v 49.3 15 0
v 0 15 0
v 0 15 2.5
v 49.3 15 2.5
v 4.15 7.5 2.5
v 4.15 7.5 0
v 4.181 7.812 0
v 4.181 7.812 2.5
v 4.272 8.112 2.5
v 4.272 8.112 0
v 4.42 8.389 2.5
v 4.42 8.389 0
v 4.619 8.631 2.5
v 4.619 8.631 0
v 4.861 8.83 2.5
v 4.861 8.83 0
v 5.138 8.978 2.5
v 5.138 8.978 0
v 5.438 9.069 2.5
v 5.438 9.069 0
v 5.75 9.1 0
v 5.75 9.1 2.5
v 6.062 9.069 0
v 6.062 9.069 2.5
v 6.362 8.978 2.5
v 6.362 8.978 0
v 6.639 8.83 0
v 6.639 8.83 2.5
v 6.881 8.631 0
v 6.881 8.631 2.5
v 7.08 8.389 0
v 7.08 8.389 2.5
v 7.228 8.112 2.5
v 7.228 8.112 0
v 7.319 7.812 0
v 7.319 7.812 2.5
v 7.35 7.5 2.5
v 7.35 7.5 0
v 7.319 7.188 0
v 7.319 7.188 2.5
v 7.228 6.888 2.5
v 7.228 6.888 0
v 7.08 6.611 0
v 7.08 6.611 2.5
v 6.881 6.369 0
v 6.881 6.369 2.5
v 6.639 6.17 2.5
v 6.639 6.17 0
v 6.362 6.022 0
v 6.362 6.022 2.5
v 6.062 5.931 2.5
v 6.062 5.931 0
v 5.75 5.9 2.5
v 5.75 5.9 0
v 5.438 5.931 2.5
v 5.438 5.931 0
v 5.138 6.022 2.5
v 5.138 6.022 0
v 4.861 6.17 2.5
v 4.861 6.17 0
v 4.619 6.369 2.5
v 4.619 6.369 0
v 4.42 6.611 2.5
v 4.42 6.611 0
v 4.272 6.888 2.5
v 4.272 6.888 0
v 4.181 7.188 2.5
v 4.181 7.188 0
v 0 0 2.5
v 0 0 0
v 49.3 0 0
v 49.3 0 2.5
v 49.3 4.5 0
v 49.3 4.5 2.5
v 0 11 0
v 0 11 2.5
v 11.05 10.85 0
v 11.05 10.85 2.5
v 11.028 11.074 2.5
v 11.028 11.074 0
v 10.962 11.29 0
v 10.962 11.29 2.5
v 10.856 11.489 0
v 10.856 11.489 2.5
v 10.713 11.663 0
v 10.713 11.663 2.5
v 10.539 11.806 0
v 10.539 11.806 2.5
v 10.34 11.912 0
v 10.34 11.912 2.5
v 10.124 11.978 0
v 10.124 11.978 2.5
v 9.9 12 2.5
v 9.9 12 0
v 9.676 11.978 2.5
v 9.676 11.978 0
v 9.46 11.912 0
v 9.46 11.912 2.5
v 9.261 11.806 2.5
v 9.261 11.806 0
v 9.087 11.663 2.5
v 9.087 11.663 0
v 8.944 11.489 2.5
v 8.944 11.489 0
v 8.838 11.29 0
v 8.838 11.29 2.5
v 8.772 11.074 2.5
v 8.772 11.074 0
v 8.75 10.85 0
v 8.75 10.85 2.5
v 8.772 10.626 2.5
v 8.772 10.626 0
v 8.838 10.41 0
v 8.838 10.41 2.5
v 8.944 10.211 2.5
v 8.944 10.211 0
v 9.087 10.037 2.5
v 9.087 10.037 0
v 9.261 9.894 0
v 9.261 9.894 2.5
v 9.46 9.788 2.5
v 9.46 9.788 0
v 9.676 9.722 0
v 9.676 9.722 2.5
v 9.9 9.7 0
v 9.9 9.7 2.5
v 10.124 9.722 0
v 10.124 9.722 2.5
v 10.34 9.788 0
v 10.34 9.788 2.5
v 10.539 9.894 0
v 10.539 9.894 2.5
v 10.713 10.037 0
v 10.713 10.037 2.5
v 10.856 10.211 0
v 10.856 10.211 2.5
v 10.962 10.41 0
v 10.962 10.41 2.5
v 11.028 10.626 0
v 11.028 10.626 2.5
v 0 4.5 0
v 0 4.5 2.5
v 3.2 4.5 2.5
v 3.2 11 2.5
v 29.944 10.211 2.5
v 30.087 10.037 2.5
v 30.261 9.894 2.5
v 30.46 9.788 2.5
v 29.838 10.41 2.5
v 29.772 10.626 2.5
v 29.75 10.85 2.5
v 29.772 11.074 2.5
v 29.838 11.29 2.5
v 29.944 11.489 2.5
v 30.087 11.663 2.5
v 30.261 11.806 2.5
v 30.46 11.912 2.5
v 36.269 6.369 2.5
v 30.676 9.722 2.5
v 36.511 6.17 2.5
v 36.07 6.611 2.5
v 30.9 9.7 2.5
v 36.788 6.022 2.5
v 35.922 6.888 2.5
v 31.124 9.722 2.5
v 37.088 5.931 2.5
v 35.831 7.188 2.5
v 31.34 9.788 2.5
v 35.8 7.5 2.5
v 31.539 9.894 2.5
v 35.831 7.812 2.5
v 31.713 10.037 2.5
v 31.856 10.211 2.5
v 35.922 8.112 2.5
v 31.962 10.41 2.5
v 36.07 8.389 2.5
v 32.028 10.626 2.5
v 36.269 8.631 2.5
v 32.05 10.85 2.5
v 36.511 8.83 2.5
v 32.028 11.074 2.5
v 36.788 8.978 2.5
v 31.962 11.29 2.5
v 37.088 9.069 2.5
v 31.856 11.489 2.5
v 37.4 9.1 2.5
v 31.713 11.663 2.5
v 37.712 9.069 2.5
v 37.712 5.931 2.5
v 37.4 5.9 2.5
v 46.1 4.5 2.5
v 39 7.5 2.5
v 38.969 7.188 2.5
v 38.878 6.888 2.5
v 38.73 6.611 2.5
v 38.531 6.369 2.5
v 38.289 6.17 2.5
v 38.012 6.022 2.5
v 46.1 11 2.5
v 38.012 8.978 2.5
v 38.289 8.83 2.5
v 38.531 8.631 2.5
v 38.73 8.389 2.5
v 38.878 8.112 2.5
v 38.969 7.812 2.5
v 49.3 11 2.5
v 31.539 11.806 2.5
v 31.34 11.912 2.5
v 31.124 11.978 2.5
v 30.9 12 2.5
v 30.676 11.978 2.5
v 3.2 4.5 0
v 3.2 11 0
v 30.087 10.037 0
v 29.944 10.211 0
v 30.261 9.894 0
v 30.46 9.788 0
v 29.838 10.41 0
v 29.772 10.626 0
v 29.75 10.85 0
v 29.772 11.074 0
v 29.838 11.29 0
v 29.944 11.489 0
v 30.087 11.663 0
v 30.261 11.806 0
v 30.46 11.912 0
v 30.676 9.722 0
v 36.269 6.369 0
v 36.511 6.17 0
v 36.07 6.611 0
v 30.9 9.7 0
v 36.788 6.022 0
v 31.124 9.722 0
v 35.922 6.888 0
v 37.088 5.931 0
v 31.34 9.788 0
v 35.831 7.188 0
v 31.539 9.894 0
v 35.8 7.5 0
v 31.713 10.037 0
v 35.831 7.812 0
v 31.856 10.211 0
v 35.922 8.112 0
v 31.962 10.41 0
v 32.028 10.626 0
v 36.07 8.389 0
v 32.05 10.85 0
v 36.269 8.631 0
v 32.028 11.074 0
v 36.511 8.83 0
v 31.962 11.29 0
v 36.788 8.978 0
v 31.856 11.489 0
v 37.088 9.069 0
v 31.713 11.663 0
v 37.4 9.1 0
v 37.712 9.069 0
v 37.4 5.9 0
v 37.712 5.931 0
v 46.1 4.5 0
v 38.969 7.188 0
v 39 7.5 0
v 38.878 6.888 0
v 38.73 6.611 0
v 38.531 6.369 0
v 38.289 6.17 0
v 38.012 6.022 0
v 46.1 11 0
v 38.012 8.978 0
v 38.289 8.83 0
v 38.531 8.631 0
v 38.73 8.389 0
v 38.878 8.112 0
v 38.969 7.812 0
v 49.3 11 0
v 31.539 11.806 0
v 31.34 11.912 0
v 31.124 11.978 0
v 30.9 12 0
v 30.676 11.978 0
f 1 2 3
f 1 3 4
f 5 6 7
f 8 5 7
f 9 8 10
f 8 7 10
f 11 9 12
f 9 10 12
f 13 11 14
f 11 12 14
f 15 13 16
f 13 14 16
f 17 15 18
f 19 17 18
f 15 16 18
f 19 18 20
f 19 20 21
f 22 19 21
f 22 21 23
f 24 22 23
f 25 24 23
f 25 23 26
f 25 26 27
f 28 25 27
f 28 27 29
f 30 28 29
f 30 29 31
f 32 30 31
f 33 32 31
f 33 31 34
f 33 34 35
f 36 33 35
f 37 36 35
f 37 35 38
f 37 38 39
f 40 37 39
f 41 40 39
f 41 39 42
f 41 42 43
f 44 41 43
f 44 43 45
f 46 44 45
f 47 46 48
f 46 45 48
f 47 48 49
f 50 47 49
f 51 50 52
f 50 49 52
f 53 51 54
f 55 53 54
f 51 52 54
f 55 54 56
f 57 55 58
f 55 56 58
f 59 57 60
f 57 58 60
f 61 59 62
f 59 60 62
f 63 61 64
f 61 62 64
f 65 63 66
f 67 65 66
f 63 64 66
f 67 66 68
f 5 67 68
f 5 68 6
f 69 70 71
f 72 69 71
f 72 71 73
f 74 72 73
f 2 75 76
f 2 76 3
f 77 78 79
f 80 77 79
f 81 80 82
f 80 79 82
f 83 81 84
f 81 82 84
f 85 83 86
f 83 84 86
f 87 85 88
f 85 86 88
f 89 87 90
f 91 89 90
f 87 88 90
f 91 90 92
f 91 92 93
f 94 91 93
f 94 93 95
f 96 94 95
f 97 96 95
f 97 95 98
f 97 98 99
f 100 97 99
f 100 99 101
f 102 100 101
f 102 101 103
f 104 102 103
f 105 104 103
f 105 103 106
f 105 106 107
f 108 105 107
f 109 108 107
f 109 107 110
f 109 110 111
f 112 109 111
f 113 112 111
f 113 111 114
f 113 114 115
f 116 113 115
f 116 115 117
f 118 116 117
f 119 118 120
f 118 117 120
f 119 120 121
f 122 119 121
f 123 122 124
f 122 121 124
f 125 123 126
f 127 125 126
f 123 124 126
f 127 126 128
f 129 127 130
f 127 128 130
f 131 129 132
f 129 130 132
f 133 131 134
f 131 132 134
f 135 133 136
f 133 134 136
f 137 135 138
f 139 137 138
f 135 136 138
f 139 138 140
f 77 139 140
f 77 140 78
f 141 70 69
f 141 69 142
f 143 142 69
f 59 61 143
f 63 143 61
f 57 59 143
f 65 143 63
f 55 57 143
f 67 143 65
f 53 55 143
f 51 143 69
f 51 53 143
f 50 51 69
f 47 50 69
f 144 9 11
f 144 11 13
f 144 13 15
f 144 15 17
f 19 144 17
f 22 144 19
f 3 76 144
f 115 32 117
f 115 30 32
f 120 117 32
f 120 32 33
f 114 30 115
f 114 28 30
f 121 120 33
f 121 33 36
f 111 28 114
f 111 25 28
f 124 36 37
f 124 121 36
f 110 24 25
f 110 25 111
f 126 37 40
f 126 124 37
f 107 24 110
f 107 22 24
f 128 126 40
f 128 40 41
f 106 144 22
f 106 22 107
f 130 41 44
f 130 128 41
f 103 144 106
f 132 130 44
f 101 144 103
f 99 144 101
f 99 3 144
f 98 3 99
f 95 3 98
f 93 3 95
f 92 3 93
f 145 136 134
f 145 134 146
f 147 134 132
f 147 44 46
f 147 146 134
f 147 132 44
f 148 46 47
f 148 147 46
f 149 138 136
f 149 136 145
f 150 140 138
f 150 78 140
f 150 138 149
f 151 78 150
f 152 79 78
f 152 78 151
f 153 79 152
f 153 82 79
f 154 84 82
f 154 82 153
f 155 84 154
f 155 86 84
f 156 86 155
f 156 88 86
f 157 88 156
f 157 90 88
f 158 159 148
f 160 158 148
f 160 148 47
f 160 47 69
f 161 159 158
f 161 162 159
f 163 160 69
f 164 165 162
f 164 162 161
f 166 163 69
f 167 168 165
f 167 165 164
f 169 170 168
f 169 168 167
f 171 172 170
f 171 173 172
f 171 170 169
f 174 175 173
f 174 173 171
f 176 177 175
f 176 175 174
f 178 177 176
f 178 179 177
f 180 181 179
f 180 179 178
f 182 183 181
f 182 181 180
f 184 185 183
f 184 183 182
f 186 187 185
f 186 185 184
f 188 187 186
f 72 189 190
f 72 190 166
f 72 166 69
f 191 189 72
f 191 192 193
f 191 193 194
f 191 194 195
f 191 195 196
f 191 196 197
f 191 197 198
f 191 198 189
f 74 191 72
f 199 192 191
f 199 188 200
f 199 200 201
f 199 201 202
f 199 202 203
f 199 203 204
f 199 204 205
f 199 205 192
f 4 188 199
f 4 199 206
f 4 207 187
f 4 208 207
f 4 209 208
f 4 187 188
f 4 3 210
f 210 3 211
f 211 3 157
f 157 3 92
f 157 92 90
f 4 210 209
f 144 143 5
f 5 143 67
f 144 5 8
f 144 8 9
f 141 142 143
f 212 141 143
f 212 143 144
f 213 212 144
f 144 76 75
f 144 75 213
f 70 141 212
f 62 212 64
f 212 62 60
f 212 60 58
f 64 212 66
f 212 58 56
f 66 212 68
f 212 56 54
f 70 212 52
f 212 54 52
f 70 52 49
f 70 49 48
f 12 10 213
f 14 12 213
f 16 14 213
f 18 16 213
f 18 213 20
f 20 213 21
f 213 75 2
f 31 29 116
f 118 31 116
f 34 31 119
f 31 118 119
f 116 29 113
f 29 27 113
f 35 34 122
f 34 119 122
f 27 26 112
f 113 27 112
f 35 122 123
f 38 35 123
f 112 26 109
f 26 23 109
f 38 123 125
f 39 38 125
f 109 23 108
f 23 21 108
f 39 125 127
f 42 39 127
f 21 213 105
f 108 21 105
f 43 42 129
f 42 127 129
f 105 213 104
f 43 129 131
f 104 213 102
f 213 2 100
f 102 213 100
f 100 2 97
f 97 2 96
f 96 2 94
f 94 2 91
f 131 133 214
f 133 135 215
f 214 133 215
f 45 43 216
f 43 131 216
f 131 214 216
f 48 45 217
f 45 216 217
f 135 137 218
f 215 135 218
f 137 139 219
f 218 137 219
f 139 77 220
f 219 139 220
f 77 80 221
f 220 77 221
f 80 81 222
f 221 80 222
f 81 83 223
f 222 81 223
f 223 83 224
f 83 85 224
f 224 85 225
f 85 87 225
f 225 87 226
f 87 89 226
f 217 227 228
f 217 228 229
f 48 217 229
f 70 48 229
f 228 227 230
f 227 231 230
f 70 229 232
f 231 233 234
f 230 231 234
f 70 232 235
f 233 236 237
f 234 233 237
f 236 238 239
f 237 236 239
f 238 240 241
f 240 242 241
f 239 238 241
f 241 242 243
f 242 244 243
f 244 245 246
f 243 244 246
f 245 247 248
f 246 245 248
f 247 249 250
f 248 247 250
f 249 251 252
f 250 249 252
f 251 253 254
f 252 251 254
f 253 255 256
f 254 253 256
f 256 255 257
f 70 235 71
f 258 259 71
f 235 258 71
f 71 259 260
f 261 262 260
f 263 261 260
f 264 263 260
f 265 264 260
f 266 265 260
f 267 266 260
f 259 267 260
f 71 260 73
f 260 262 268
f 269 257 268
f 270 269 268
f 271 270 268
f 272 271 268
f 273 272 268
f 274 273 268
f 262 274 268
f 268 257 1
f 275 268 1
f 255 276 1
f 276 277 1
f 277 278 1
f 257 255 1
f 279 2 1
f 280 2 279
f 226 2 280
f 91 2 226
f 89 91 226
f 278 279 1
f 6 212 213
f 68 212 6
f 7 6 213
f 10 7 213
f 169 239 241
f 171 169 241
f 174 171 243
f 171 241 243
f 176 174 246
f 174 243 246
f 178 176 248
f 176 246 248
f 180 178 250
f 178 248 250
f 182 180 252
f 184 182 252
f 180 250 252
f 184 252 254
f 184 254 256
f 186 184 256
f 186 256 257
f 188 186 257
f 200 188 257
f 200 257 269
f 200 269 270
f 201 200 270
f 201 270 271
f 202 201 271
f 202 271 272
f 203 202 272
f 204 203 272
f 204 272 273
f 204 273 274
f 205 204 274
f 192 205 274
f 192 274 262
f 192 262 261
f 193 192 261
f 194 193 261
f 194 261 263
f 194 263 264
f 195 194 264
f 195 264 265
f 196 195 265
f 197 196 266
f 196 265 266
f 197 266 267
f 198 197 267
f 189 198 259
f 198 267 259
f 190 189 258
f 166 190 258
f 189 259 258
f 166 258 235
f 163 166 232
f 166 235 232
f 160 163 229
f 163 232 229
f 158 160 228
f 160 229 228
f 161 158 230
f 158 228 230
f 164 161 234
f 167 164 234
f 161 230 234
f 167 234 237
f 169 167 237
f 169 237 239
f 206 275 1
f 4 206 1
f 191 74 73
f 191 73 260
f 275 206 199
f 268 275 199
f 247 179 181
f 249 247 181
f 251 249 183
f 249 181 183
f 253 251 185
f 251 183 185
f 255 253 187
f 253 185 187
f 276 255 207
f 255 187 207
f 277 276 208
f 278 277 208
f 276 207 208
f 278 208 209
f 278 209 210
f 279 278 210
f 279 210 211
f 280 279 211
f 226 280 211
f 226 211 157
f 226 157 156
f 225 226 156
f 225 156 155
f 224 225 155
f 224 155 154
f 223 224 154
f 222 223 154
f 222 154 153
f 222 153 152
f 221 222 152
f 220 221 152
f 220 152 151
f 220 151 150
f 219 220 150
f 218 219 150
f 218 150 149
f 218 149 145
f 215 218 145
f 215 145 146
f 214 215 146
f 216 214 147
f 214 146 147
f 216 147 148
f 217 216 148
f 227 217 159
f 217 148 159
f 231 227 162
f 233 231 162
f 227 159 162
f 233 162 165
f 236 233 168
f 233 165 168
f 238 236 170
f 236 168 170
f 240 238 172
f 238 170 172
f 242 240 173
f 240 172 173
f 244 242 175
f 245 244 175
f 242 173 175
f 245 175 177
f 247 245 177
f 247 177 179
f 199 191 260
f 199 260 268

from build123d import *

# Parameters (mm, degrees)
SKETCH_1_W          = 49.3
SKETCH_1_H          = 15
EXTRUDE_1_DEPTH     = 2.5
SKETCH_2_R          = 1.6
CUT_EXTRUDE_1_DEPTH = 52.592053652
SKETCH_3_W          = 3.2
SKETCH_3_H          = 6.5
CUT_EXTRUDE_2_DEPTH = 10
SKETCH_4_R          = 1.15
CUT_EXTRUDE_3_DEPTH = 10


with BuildPart() as part:
    # 草图1 → 凸台-拉伸1 (new body)
    with BuildSketch(Plane.XY):
        with Locations((24.65, 7.5)):
            Rectangle(SKETCH_1_W, SKETCH_1_H)
    extrude(amount=EXTRUDE_1_DEPTH)

    # 草图2 → 切除-拉伸1 (cut, through all)
    with BuildSketch(Plane(origin=(0, 0, 0), x_dir=(-1, 0, 0), z_dir=(0, 0, -1))):
        with Locations((-5.75, 7.5)):
            Circle(SKETCH_2_R)
        with Locations((-37.4, 7.5)):
            Circle(SKETCH_2_R)
    extrude(amount=-CUT_EXTRUDE_1_DEPTH, mode=Mode.SUBTRACT)

    # 草图3 → 切除-拉伸2 (cut)
    with BuildSketch(Plane.XY.offset(2.5)):
        with Locations((1.6, 7.75)):
            Rectangle(SKETCH_3_W, SKETCH_3_H)
    cut_extrude_2 = extrude(amount=-CUT_EXTRUDE_2_DEPTH, mode=Mode.SUBTRACT)

    # 镜向1: 切除-拉伸2 across plane
    add(cut_extrude_2.mirror(Plane.ZY.offset(-24.65)), mode=Mode.SUBTRACT)

    # 草图4 → 切除-拉伸3 (cut)
    with BuildSketch(Plane.XY.offset(2.5)):
        with Locations((9.9, 10.85)):
            Circle(SKETCH_4_R)
        with Locations((30.9, 10.85)):
            Circle(SKETCH_4_R)
    extrude(amount=-CUT_EXTRUDE_3_DEPTH, mode=Mode.SUBTRACT)


solid = part.part
